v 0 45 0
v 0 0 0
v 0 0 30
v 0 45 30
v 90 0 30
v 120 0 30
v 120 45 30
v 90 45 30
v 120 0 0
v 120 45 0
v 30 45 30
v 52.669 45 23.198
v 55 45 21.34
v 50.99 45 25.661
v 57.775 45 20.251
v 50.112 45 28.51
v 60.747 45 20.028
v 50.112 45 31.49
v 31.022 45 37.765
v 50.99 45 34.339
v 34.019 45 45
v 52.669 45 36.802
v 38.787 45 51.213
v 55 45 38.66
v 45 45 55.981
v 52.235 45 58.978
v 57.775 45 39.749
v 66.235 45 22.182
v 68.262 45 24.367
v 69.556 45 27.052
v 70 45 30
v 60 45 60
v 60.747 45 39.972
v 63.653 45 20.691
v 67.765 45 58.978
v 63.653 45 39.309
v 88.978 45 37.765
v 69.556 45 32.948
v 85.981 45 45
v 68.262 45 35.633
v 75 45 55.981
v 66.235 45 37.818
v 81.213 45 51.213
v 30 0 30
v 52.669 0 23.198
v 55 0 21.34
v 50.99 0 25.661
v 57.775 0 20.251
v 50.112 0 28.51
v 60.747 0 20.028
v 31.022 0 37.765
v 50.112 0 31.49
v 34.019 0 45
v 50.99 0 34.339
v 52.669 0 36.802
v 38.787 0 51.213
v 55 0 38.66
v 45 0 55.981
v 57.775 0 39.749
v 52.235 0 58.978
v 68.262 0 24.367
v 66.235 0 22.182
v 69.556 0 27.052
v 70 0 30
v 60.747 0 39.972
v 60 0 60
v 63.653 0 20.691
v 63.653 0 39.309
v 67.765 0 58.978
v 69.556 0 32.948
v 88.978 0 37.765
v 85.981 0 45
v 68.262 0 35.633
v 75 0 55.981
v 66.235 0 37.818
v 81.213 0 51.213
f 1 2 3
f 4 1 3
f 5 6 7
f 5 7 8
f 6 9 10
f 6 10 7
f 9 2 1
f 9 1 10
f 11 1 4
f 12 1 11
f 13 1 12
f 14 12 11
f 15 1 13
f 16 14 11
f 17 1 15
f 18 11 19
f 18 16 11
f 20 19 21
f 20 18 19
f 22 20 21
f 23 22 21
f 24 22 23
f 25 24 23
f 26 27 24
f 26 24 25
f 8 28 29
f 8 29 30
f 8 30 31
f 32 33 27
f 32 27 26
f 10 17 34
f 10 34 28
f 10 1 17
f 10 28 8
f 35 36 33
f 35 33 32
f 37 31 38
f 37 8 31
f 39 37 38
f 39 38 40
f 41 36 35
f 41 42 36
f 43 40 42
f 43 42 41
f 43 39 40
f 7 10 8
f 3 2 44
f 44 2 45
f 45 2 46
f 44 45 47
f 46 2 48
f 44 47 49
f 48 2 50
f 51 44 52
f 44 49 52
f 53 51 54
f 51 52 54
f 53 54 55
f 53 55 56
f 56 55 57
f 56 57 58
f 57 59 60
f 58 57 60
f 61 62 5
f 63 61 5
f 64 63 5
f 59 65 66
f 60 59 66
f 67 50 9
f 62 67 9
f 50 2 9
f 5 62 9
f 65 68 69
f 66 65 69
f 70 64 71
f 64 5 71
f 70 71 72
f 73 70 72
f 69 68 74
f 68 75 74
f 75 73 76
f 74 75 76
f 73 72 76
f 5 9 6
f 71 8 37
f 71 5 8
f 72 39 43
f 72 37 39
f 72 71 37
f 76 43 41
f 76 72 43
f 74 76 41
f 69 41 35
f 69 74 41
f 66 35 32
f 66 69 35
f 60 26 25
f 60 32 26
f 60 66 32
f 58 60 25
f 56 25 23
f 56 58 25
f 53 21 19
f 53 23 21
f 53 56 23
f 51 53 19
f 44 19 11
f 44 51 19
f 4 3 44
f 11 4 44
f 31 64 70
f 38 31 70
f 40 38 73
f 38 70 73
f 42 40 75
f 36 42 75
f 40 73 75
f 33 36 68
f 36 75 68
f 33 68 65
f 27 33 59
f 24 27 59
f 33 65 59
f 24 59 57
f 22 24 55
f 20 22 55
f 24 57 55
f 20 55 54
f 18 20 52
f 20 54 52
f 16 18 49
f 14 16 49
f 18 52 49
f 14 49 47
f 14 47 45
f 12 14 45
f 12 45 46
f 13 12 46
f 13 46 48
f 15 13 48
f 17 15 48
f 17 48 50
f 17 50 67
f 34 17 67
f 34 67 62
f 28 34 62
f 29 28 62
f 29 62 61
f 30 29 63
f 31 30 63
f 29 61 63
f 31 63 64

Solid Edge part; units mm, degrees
sketch "Sketch1" plane through (0, 0, 0) normal (0, -1, 0) x (1, 0, 0)
  arc A0 (30, 30) -> (90, 30) centre (60, 30) cw
  line L0 (120, 30) -> (90, 30)
  line L1 (120, 0) -> (120, 30)
  line L2 (0, 0) -> (120, 0)
  line L3 (0, 0) -> (0, 30)
  line L4 (0, 30) -> (30, 30)
extrude "Protrusion1" add sketch "Sketch1" against normal blind 45
sketch "Sketch2" plane through (60, 0, 30) normal (0, -1, 0) x (1, 0, 0)
  circle A0 centre (0, 0) radius 10
extrude "ExtrudedCutout_1" cut sketch "Sketch2" against normal blind 214.5997
